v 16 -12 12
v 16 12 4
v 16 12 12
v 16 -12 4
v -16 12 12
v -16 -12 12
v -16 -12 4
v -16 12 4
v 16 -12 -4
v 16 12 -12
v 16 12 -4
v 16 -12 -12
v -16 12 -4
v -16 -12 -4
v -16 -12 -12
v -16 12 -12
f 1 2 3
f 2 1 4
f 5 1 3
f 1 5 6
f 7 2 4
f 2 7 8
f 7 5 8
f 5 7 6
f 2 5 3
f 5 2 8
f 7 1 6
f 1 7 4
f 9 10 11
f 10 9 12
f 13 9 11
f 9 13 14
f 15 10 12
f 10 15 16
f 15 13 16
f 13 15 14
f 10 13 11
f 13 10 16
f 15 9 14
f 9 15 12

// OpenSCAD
size = 32;//block=32 //item=8


module beltPiece() {

  translate([0, 0, size * 0.25]) {//top
    cube([size * 1, size * 0.75, size * 0.25], center = true);
  }
  ;//translate
  translate([0, 0, -size * 0.25]) {//bottom
    cube([size * 1, size * 0.75, size * 0.25], center = true);
  }
  ;//translate

  //translate([-size*0.5,0,0]){	//left
//cube([size*0.25,size*0.75,size*0.5],center=true);
//};	//translate

//translate([size*0.5,0,0]){	//right
//cube([size*0.25,size*0.75,size*0.5],center=true);
//};	//translate

}
;


beltPiece();
